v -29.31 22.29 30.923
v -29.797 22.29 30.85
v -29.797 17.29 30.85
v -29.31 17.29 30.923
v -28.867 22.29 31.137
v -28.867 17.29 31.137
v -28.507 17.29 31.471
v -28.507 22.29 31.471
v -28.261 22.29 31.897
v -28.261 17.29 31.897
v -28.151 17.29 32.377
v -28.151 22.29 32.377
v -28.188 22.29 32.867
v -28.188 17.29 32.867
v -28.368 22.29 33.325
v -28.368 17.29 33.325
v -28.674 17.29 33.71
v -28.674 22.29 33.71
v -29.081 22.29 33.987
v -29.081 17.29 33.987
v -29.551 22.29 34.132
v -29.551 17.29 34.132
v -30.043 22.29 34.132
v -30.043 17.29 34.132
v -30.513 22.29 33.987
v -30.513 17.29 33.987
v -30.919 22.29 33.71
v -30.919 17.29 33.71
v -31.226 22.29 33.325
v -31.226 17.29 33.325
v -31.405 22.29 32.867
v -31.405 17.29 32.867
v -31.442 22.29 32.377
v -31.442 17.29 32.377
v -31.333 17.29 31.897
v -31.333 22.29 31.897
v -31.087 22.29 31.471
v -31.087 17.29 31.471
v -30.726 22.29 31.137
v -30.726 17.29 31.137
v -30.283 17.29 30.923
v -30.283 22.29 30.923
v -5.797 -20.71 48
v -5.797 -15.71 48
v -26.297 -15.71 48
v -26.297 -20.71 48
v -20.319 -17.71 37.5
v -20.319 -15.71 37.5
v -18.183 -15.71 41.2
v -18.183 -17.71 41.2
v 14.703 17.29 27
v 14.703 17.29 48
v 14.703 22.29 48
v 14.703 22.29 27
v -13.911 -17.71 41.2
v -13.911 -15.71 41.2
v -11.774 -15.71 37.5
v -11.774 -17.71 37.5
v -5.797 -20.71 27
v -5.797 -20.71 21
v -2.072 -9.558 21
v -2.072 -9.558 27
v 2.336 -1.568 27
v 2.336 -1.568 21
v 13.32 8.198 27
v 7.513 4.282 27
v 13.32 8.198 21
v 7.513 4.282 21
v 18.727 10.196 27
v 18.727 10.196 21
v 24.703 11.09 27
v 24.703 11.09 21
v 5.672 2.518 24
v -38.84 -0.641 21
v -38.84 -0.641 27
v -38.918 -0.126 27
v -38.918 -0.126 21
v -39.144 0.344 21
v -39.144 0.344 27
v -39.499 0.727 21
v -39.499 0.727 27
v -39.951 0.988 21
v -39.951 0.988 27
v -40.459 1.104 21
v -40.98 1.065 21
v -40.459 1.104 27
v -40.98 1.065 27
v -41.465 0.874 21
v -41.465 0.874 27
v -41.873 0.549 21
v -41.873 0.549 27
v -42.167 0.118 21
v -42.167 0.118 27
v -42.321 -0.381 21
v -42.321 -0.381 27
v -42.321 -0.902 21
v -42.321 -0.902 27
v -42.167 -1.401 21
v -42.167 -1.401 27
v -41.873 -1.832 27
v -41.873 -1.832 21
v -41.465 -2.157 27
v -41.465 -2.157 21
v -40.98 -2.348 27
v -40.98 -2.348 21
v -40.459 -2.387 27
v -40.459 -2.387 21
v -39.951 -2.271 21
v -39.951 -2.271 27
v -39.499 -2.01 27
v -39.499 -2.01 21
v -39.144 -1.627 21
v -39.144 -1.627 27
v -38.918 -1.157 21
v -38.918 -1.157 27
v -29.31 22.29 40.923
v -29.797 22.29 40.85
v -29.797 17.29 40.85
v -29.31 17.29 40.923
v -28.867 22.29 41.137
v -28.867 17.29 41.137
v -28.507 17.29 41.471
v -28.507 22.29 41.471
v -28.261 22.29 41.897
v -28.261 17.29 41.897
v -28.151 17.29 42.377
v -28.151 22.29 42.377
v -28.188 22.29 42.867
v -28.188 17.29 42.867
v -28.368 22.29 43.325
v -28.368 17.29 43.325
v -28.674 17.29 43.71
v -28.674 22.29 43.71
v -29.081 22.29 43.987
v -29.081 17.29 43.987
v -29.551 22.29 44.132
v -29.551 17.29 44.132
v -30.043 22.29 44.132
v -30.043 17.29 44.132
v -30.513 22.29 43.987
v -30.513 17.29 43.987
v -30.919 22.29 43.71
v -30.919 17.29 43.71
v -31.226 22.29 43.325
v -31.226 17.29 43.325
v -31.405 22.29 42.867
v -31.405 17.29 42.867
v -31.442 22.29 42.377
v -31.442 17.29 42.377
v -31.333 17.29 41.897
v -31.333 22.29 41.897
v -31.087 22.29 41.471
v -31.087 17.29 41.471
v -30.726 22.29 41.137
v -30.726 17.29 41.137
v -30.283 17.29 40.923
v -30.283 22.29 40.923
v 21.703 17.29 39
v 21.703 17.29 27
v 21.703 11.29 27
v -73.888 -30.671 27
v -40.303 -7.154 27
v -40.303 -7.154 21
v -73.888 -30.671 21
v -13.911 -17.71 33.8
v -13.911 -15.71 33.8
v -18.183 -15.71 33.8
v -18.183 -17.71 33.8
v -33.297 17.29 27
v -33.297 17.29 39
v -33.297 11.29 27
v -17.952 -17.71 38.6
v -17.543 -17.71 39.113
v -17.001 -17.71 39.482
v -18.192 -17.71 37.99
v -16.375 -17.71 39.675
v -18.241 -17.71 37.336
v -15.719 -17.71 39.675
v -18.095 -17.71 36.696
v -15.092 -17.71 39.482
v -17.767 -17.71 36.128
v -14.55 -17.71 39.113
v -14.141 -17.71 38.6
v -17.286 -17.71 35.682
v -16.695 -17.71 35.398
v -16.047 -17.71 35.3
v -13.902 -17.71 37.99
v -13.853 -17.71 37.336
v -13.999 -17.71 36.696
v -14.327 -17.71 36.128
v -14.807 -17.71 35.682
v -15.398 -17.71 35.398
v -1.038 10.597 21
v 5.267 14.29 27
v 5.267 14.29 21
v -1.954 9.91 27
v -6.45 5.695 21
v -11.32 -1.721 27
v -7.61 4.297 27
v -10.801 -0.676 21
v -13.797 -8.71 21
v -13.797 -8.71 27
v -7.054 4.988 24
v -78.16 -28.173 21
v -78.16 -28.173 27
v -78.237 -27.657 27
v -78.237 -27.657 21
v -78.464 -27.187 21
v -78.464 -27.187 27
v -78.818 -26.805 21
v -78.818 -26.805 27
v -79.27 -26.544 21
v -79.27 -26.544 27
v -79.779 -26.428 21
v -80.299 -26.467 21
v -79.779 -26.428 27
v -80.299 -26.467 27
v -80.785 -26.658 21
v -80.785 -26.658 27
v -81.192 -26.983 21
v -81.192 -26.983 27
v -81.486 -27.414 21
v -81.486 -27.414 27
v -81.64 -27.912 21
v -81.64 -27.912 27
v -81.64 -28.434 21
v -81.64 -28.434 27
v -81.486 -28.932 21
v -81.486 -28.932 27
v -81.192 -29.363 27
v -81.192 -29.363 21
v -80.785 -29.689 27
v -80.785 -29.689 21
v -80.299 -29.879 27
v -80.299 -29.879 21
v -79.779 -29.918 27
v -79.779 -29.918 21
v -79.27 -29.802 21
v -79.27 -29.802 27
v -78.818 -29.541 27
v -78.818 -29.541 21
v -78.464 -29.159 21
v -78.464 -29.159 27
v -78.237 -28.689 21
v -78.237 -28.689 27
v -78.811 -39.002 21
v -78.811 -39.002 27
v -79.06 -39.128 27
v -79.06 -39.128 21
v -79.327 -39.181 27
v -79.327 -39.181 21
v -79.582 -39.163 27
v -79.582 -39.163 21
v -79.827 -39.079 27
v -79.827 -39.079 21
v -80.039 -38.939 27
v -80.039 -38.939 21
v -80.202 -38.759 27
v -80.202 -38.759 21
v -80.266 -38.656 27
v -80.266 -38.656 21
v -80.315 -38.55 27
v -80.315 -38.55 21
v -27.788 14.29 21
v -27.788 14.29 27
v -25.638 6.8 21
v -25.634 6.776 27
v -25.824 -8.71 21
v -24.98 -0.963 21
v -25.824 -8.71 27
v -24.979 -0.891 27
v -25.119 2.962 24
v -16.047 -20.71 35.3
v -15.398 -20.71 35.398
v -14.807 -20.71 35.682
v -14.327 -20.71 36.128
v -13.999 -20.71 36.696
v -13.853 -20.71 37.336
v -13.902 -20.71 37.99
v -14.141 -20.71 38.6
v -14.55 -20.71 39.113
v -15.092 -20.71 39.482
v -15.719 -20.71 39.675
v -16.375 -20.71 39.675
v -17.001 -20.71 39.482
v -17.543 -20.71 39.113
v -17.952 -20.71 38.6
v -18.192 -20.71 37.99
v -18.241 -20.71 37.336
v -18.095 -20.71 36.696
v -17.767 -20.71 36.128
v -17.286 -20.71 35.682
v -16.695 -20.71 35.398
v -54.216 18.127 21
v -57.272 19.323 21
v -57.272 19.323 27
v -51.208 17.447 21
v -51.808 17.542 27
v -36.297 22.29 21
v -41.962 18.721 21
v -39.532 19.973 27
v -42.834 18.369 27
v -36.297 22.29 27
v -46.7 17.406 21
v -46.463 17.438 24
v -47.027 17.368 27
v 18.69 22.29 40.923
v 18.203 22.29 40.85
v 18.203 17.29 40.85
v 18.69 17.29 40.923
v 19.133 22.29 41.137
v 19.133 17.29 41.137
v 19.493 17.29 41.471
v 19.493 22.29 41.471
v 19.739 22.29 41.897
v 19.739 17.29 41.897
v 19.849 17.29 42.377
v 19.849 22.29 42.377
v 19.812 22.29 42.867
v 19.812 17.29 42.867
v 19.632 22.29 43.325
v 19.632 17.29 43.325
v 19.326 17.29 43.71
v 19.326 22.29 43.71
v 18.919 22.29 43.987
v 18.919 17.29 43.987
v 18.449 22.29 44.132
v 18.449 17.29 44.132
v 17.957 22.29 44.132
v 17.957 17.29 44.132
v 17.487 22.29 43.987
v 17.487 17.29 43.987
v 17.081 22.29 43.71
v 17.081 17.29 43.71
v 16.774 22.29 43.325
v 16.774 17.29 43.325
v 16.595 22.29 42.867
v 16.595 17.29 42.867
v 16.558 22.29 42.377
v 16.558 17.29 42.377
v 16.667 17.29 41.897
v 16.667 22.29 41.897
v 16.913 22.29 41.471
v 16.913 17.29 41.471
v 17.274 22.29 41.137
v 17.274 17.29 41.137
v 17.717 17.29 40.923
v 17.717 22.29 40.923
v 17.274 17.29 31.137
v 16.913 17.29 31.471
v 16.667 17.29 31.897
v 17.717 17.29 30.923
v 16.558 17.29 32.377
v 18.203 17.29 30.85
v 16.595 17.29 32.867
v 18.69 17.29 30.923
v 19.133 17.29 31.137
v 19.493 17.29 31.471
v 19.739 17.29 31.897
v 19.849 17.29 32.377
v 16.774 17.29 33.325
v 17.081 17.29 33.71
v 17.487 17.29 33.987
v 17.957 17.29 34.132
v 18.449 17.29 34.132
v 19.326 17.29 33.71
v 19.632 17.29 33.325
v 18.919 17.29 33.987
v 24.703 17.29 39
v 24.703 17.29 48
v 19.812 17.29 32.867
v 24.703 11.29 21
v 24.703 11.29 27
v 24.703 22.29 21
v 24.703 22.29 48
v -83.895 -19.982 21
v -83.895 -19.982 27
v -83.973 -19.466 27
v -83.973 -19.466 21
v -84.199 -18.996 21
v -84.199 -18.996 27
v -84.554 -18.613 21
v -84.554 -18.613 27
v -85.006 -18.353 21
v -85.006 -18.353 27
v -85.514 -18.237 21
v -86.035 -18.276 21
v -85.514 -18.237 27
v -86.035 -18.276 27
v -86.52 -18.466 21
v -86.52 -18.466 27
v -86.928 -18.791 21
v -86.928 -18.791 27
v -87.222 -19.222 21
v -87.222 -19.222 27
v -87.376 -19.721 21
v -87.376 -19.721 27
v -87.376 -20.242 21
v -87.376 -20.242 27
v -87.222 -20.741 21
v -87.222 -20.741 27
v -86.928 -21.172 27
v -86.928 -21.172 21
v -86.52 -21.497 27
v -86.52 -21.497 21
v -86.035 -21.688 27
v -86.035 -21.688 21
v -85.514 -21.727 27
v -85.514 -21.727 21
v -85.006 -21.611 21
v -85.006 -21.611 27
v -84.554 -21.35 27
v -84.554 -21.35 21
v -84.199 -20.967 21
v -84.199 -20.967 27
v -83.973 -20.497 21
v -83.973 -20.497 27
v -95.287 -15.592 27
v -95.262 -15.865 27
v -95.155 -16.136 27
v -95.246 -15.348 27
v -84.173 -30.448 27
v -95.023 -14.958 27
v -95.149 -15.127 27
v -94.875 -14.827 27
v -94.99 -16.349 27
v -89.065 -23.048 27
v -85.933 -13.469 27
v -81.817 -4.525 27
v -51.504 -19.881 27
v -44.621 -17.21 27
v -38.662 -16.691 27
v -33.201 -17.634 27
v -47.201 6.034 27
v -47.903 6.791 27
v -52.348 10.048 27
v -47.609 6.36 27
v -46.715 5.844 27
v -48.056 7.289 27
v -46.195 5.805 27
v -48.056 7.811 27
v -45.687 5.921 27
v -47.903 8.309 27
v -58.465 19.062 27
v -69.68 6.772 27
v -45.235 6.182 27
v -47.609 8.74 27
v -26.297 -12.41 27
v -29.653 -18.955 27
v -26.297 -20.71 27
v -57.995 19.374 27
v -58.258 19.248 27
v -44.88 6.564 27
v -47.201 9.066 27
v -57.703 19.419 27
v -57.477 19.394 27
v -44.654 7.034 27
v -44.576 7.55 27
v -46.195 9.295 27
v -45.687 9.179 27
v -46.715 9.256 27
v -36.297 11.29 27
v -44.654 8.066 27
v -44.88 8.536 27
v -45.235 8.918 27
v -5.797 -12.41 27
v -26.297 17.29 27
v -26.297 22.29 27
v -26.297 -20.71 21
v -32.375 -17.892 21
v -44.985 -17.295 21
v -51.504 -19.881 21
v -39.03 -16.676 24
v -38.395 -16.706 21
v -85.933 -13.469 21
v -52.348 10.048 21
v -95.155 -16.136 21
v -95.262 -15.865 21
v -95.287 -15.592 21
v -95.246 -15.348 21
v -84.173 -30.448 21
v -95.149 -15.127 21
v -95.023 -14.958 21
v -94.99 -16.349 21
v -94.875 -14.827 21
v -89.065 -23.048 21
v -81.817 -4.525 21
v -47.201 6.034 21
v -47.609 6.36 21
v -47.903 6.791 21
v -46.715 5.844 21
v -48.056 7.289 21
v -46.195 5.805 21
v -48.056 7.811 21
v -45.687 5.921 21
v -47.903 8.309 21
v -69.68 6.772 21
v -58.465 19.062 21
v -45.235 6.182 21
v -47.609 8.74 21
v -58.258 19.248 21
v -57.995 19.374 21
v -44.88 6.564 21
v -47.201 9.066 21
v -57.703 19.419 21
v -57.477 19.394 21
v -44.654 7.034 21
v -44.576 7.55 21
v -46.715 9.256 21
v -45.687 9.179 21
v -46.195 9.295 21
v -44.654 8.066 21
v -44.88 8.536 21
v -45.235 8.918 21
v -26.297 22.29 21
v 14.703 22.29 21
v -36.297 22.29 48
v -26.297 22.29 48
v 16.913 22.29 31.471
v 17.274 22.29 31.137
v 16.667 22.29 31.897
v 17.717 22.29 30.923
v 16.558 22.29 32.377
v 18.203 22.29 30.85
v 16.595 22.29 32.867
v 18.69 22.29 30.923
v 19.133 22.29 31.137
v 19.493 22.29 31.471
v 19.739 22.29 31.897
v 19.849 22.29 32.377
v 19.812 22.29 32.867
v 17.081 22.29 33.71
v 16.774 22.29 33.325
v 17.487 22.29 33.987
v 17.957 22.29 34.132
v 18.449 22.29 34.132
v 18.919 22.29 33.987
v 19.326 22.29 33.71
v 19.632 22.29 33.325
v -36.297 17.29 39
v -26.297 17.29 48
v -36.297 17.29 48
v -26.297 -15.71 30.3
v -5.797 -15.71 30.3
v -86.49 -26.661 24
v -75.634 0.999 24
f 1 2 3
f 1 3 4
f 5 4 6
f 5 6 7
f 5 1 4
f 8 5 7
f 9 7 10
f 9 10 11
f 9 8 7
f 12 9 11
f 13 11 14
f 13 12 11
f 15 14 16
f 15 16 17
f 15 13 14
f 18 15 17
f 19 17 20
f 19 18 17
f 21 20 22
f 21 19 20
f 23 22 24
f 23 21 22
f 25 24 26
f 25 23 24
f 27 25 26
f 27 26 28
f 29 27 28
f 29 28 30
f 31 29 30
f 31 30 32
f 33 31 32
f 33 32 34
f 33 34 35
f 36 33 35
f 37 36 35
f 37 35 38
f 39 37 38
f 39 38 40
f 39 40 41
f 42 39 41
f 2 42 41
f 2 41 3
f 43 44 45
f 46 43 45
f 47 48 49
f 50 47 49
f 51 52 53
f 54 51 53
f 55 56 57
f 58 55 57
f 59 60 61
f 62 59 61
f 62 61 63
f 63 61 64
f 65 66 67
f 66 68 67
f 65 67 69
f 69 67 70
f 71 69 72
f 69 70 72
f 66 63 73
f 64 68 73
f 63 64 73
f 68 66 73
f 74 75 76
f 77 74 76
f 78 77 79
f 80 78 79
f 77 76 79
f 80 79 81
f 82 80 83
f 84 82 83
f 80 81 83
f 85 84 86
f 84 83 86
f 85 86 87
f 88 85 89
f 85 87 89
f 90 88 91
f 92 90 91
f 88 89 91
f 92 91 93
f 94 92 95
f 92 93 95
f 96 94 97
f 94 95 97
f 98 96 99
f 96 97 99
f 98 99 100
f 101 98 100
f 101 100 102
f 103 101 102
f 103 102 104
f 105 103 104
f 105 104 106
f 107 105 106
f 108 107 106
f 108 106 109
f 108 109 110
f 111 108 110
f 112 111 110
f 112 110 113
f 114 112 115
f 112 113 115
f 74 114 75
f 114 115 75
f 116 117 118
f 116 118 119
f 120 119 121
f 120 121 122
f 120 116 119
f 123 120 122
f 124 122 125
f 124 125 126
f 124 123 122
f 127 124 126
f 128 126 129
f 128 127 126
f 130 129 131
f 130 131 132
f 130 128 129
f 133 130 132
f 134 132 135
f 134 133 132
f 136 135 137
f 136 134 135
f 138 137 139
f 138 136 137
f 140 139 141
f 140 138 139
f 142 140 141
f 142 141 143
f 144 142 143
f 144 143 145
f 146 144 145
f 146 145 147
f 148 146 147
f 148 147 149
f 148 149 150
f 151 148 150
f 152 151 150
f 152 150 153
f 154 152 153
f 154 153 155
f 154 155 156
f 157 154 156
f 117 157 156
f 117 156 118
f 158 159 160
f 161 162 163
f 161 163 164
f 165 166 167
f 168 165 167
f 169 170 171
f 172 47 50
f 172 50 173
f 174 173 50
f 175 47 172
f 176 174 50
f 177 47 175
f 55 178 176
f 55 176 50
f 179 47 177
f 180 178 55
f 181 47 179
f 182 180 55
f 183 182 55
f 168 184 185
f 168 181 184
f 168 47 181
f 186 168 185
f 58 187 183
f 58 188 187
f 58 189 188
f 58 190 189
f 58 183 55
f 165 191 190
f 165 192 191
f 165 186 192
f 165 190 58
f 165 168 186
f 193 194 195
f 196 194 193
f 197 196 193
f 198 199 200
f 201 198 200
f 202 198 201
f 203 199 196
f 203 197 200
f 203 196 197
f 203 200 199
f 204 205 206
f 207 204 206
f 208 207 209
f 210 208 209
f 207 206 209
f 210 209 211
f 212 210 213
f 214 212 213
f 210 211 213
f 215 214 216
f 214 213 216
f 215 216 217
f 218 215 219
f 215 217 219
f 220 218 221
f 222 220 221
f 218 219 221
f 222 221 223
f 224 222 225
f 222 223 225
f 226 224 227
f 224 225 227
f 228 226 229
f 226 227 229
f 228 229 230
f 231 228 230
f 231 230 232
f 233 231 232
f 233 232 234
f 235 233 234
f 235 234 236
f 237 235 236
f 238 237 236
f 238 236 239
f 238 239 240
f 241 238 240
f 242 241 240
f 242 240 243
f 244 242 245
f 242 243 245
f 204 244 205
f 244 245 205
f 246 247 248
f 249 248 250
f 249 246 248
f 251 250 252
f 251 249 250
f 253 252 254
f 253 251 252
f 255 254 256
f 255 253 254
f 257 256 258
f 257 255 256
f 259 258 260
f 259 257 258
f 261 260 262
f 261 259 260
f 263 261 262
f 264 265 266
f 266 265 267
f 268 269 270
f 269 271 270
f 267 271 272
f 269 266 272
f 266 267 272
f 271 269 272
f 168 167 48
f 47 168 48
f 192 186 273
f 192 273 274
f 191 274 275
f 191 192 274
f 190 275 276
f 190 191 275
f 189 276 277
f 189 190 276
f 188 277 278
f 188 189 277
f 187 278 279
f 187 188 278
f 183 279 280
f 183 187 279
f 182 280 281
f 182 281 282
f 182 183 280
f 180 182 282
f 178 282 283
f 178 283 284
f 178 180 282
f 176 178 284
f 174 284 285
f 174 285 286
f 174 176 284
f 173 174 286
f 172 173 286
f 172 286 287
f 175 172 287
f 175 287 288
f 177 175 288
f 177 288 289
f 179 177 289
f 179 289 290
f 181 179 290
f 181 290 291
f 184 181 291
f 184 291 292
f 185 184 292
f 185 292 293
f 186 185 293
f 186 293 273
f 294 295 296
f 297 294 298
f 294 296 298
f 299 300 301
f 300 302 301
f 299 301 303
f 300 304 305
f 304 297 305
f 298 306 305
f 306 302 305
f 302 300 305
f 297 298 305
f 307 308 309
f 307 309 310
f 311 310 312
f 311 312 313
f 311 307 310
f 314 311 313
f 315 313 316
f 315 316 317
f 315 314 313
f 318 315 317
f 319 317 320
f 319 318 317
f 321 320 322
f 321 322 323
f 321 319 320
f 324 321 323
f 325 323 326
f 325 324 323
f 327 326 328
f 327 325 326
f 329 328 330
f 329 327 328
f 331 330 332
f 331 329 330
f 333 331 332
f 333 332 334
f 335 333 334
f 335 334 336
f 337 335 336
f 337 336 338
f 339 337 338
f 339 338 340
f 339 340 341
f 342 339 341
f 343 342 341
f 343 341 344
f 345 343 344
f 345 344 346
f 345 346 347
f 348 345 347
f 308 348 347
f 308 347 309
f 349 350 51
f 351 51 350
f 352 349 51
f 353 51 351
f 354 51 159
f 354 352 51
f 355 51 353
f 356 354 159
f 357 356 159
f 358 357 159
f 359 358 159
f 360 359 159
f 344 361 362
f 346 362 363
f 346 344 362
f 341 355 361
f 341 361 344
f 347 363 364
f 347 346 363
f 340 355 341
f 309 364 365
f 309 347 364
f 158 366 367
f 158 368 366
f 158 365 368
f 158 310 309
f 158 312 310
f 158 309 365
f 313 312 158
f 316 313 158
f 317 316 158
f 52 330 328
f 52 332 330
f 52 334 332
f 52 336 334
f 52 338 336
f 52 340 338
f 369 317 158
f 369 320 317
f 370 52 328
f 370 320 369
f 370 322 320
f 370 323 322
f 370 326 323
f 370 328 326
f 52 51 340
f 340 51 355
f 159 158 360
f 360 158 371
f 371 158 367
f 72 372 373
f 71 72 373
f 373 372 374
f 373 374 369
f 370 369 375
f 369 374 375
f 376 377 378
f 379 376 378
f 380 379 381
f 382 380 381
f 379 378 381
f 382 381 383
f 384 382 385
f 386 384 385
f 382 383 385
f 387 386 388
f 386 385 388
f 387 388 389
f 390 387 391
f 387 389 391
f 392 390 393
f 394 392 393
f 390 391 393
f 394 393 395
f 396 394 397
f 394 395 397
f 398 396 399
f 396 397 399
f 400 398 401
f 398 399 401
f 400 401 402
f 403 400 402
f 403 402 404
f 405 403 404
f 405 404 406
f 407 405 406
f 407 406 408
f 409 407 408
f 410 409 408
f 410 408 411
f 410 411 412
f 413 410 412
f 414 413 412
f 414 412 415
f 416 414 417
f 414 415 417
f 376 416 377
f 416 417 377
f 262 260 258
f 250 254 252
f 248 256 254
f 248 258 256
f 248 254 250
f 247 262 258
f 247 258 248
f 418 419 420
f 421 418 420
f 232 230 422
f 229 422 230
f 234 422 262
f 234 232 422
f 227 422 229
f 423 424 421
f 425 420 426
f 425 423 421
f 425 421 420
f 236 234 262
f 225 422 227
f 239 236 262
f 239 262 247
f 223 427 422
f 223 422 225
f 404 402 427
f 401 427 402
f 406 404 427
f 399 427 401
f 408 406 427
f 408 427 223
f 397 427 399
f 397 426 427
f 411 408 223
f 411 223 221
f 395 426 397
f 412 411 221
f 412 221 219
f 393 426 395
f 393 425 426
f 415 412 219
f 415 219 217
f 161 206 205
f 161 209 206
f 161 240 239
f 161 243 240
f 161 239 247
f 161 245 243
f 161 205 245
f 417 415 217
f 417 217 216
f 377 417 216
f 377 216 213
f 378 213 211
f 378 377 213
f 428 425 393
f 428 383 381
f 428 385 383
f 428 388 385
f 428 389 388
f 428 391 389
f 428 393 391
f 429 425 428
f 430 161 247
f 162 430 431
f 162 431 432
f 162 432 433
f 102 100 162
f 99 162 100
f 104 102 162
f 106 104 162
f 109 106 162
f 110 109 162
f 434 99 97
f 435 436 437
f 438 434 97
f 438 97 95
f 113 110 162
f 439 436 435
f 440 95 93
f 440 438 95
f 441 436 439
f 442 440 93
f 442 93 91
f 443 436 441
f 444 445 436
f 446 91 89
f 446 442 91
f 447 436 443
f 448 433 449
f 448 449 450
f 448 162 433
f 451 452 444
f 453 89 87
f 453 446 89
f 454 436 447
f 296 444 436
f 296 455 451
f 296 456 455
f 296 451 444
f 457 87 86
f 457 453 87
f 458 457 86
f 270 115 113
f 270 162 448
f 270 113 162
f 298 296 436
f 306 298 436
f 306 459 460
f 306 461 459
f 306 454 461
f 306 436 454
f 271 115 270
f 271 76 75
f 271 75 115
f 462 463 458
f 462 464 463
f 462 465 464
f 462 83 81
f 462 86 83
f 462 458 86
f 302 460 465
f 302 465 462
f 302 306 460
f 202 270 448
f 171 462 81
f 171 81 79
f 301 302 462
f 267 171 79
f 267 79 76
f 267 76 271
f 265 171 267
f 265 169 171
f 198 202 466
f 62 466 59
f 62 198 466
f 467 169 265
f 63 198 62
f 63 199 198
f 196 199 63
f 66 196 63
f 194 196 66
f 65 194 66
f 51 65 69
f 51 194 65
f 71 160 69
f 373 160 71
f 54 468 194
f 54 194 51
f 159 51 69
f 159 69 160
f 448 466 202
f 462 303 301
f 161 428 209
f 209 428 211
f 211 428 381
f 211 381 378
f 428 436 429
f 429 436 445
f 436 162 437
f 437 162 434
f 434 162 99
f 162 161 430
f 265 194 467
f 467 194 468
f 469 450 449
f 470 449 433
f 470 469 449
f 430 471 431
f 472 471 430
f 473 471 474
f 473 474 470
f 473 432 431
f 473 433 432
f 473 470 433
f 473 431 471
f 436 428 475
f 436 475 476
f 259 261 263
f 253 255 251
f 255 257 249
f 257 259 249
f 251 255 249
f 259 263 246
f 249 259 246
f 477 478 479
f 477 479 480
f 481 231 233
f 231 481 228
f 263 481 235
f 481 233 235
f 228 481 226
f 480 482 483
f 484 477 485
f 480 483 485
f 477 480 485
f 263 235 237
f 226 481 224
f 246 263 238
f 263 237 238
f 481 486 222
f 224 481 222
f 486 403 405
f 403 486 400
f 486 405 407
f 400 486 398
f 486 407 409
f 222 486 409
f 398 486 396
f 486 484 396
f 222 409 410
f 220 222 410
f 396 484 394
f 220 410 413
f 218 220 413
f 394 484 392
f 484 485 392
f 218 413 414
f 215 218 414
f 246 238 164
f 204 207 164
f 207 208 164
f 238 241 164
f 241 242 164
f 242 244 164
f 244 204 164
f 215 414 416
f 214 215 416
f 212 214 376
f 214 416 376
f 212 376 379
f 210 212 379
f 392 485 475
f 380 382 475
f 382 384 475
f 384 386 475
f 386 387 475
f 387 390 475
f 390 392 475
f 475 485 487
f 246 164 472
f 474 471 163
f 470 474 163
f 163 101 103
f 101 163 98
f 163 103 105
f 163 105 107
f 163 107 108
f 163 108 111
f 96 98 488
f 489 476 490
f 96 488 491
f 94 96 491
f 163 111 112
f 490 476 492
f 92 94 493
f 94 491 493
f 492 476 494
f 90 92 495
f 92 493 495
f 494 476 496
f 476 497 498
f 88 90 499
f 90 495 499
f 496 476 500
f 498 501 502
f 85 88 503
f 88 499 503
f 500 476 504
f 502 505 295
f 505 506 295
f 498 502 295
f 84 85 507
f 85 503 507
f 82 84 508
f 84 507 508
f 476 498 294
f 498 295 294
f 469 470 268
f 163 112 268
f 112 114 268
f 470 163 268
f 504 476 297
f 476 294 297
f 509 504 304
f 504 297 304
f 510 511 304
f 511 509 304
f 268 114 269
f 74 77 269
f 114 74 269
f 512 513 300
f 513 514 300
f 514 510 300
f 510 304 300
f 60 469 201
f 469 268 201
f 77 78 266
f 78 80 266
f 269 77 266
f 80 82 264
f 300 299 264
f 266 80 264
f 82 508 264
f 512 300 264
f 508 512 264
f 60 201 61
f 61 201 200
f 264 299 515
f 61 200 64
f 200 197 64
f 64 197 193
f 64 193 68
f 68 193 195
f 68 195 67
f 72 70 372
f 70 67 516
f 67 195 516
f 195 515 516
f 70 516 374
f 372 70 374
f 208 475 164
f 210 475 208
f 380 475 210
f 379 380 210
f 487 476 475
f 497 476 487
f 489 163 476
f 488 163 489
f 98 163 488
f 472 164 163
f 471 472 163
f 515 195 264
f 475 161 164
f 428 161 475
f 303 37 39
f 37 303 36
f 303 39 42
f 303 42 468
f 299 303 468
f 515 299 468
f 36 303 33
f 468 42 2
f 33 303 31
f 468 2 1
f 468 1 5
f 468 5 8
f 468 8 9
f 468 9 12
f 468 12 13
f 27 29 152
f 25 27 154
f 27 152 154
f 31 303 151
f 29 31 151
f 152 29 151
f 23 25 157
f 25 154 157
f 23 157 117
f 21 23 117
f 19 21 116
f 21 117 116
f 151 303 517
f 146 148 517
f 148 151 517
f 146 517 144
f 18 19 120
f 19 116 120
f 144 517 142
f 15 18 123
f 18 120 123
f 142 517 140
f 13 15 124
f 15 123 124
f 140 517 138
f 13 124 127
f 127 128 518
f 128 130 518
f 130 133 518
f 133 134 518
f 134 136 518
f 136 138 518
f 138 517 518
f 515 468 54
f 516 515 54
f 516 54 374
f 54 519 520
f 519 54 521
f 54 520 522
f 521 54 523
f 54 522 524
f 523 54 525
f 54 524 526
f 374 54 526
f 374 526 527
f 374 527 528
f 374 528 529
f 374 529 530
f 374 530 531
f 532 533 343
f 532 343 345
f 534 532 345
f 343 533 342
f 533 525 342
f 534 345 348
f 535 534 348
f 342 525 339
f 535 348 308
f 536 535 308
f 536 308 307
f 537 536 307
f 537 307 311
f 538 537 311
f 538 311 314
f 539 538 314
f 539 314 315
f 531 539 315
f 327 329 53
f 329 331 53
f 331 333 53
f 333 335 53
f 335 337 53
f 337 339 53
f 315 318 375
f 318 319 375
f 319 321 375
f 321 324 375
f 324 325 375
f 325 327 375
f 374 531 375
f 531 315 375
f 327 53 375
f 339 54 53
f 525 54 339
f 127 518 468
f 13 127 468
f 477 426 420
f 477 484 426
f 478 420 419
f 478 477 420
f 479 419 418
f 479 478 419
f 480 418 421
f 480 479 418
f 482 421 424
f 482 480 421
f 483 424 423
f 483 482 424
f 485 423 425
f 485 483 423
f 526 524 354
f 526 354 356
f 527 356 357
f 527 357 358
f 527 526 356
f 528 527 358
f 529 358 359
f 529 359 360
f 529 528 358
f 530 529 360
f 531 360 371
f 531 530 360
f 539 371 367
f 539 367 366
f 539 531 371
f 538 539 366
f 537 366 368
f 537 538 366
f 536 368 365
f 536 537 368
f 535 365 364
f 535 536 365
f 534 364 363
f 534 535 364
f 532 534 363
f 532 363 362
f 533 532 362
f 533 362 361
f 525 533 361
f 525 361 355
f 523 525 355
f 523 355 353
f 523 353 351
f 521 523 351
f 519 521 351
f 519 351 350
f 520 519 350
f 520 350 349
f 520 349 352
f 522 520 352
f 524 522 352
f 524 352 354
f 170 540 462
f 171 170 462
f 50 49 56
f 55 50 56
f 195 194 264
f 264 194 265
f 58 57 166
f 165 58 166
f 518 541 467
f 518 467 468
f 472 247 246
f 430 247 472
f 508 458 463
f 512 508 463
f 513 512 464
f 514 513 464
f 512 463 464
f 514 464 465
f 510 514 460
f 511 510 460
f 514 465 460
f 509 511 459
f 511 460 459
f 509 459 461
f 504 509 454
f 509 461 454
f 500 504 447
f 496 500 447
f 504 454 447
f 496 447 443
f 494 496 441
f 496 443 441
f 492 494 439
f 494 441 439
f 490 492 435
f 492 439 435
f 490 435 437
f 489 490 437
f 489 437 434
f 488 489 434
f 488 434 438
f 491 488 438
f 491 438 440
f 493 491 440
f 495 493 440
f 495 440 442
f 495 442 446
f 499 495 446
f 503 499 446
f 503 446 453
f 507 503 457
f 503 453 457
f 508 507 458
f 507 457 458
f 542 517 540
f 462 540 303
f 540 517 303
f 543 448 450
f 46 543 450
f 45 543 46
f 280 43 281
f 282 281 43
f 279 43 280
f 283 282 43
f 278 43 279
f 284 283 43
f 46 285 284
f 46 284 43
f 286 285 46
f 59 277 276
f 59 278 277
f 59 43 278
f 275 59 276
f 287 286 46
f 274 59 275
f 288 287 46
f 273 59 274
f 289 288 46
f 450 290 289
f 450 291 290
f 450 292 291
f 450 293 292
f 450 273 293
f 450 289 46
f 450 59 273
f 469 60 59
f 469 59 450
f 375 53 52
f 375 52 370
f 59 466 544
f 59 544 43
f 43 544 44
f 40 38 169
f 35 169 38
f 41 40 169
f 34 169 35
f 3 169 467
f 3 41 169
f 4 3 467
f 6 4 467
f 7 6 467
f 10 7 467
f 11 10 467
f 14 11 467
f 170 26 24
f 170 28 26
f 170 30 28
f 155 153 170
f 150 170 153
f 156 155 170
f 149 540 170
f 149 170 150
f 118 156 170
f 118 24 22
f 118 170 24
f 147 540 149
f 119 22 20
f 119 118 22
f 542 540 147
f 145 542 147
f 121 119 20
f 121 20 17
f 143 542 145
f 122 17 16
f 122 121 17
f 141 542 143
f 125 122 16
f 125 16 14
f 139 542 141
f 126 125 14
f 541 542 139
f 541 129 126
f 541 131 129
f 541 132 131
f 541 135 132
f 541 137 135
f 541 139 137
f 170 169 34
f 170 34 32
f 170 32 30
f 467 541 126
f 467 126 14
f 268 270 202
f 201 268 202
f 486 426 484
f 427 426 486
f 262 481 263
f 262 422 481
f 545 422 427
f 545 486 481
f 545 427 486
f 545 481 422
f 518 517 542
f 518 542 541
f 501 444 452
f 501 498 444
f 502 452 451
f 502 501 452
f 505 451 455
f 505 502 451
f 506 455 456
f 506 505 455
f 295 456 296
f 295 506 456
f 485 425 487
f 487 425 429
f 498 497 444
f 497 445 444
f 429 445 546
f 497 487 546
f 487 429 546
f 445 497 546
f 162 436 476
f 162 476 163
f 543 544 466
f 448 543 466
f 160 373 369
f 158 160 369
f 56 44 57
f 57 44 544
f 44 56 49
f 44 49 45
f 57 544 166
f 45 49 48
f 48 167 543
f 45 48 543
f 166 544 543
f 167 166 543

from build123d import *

# Parameters (mm, degrees)
SKETCH1_W             = 10
SKETCH1_H             = 5
BOSS_EXTRUDE1_DEPTH   = 21
BOSS_EXTRUDE1_2_DEPTH = 21
BOSS_EXTRUDE2_DEPTH   = 6
SKETCH3_W             = 20.5
SKETCH3_H             = 5
BOSS_EXTRUDE3_DEPTH   = 21
CUT_EXTRUDE1_REACH    = 64.414
SKETCH4_R             = 1.65
CUT_EXTRUDE2_REACH    = 61.08
SKETCH5_R             = 2.2
SKETCH6_R             = 1.75
BOSS_EXTRUDE4_DEPTH   = 6
CUT_EXTRUDE3_REACH    = 107.857
CUT_EXTRUDE7_REACH    = 109.208
BOSS_EXTRUDE5_DEPTH   = 6
BOSS_EXTRUDE6_DEPTH   = 3
BOSS_EXTRUDE7_DEPTH   = 3
BOSS_EXTRUDE8_DEPTH   = 20.5
SKETCH16_W            = 61.423716469
SKETCH16_H            = 45.352356837
CUT_EXTRUDE8_DEPTH    = 21
CUT_EXTRUDE9_DEPTH    = 6
FILLET1_R             = 1
CUT_EXTRUDE10_DEPTH   = 2


with BuildPart() as part:
    # Sketch1 → Boss-Extrude1 (new body)
    with BuildSketch(Plane.XY):
        with Locations((-31.296703297, 19.79010989)):
            Rectangle(SKETCH1_W, SKETCH1_H)
    boss_extrude1 = extrude(amount=BOSS_EXTRUDE1_DEPTH)



with BuildPart() as body_2:
    # Sketch1 → Boss-Extrude1 2 (new body)
    with BuildSketch(Plane.XY):
        with Locations((19.703296703, 19.79010989)):
            Rectangle(SKETCH1_W, SKETCH1_H)
    boss_extrude1_2 = extrude(amount=BOSS_EXTRUDE1_2_DEPTH)


with BuildPart() as part_1:
    add(part.part)

    add(body_2.part)  # Boss-Extrude2 merges body 2
    # Sketch2 → Boss-Extrude2 (add)
    with BuildSketch(Plane.XY.offset(21)):
        Polygon((-36.296703297, 22.29010989), (24.703296703, 22.29010989), (24.703296703, 7.29010989), (12.703296703, 7.29010989), (-5.796703297, -11.20989011), (-5.796703297, -20.70989011), (-36.296703297, -20.70989011), align=None)
    extrude(amount=BOSS_EXTRUDE2_DEPTH)

    # Sketch3 → Boss-Extrude3 (add)
    with BuildSketch(Plane(origin=(0, 0, 21), x_dir=(-1, 0, 0), z_dir=(0, 0, -1))):
        with Locations((16.046703297, -18.20989011)):
            Rectangle(SKETCH3_W, SKETCH3_H)
    boss_extrude3 = extrude(amount=BOSS_EXTRUDE3_DEPTH)

    # Sketch4 → Cut-Extrude1 (cut, up to next)
    with BuildSketch(Plane(origin=(0, 22.29010989, 0), x_dir=(1, 0, 0), z_dir=(0, 1, 0)), mode=Mode.PRIVATE) as cut_extrude1_sk1:
        with Locations(Location((-29.796703297, -5.5, 0), (0, 0, 270))):
            Circle(SKETCH4_R)
    cut_extrude1_tool1 = extrude(cut_extrude1_sk1.sketch, amount=-CUT_EXTRUDE1_REACH, mode=Mode.PRIVATE) & part_1.part
    # Sketch4 → Cut-Extrude1 (cut, up to next)
    with BuildSketch(Plane(origin=(0, 22.29010989, 0), x_dir=(1, 0, 0), z_dir=(0, 1, 0)), mode=Mode.PRIVATE) as cut_extrude1_sk2:
        with Locations(Location((18.203296703, -5.5, 0), (0, 0, 270))):
            Circle(SKETCH4_R)
    cut_extrude1_tool2 = extrude(cut_extrude1_sk2.sketch, amount=-CUT_EXTRUDE1_REACH, mode=Mode.PRIVATE) & part_1.part
    # Sketch4 → Cut-Extrude1 (cut, up to next)
    with BuildSketch(Plane(origin=(0, 22.29010989, 0), x_dir=(1, 0, 0), z_dir=(0, 1, 0)), mode=Mode.PRIVATE) as cut_extrude1_sk3:
        with Locations(Location((18.203296703, -15.5, 0), (0, 0, 270))):
            Circle(SKETCH4_R)
    cut_extrude1_tool3 = extrude(cut_extrude1_sk3.sketch, amount=-CUT_EXTRUDE1_REACH, mode=Mode.PRIVATE) & part_1.part
    # Sketch4 → Cut-Extrude1 (cut, up to next)
    with BuildSketch(Plane(origin=(0, 22.29010989, 0), x_dir=(1, 0, 0), z_dir=(0, 1, 0)), mode=Mode.PRIVATE) as cut_extrude1_sk4:
        with Locations(Location((-29.796703297, -15.5, 0), (0, 0, 270))):
            Circle(SKETCH4_R)
    cut_extrude1_tool4 = extrude(cut_extrude1_sk4.sketch, amount=-CUT_EXTRUDE1_REACH, mode=Mode.PRIVATE) & part_1.part
    cut_extrude1_1 = cut_extrude1_tool1.solids().sort_by_distance((-29.796703, 22.29011, 5.5))[0]
    add(cut_extrude1_1, mode=Mode.SUBTRACT)
    cut_extrude1_2 = cut_extrude1_tool2.solids().sort_by_distance((18.203297, 22.29011, 5.5))[0]
    add(cut_extrude1_2, mode=Mode.SUBTRACT)
    cut_extrude1_3 = cut_extrude1_tool3.solids().sort_by_distance((18.203297, 22.29011, 15.5))[0]
    add(cut_extrude1_3, mode=Mode.SUBTRACT)
    cut_extrude1_4 = cut_extrude1_tool4.solids().sort_by_distance((-29.796703, 22.29011, 15.5))[0]
    add(cut_extrude1_4, mode=Mode.SUBTRACT)
    cut_extrude1 = cut_extrude1_1 + cut_extrude1_2 + cut_extrude1_3 + cut_extrude1_4  # Cut-Extrude1 as one shape, for the pattern or mirror that repeats it

    # Sketch5 → Cut-Extrude2 (cut, up to next)
    with BuildSketch(Plane(origin=(0, -15.70989011, 0), x_dir=(1, 0, 0), z_dir=(0, 1, 0)), mode=Mode.PRIVATE) as cut_extrude2_sk1:
        with Locations(Location((-16.046703297, -10.5, 0), (0, 0, 270))):
            Circle(SKETCH5_R)
    cut_extrude2_tool1 = extrude(cut_extrude2_sk1.sketch, amount=-CUT_EXTRUDE2_REACH, mode=Mode.PRIVATE) & part_1.part
    cut_extrude2 = cut_extrude2_tool1.solids().sort_by_distance((-16.046703, -15.70989, 10.5))[0]
    add(cut_extrude2, mode=Mode.SUBTRACT)

    # Sketch6 → Boss-Extrude4 (add)
    with BuildSketch(Plane.XY.offset(27)):
        with BuildLine():
            Line((-79.859138265, -39.735236509), (-51.503727763, -19.880564327))
            add(Edge.make_bspline(
                [(-51.503727763, -19.880564327), (-43.777944292, -18.491061957), (-36.296703297, -20.70989011)],
                knots=[0, 0, 0, 1, 1, 1], degree=2))
            Line((-36.296703297, -20.70989011), (-36.296703297, 22.29010989))
            add(Edge.make_bspline(
                [(-57.962836939, 19.661219133), (-46.447122218, 13.814864777), (-36.296703297, 22.29010989)],
                knots=[0, 0, 0, 1, 1, 1], degree=2))
            add(Edge.make_bspline(
                [(-95.842115451, -15.524174544), (-74.663700283, -0.348148579), (-57.962836939, 19.661219133)],
                knots=[0, 0, 0, 1, 1, 1], degree=2))
            add(Edge.make_bspline(
                [(-95.842115451, -15.524174544), (-85.086697095, -25.754599345), (-79.859138265, -39.735236509)],
                knots=[0, 0, 0, 1, 1, 1], degree=2))
        make_face()
        with Locations((-40.590214383, -0.641481396)):
            Circle(SKETCH6_R, mode=Mode.SUBTRACT)
        with Locations((-85.645276872, -19.981629898)):
            Circle(SKETCH6_R, mode=Mode.SUBTRACT)
        with Locations((-79.909512508, -28.173150341)):
            Circle(SKETCH6_R, mode=Mode.SUBTRACT)
        with Locations((-46.325978746, 7.550039047)):
            Circle(SKETCH6_R, mode=Mode.SUBTRACT)
        Polygon((-85.932915117, -13.468776127), (-52.347681301, 10.047857763), (-40.302576138, -7.154335167), (-73.887809953, -30.670969058), align=None, mode=Mode.SUBTRACT)
    extrude(amount=-BOSS_EXTRUDE4_DEPTH)

    # Sketch7 → Cut-Extrude3 (cut, up to next)
    with BuildSketch(Plane(origin=(0, 0, 21), x_dir=(-1, 0, 0), z_dir=(0, 0, -1)), mode=Mode.PRIVATE) as cut_extrude3_sk1:
        with BuildLine():
            Line((36.296703297, -20.70989011), (26.296703297, -20.70989011))
            add(Edge.make_bspline(
                [(26.296703297, -20.70989011), (39.15974316, -13.056772406), (51.503727763, -19.880564327)],
                knots=[0, 0, 0, 1, 1, 1], degree=2))
            add(Edge.make_bspline(
                [(51.503727763, -19.880564327), (43.777944292, -18.491061957), (36.296703297, -20.70989011)],
                knots=[0, 0, 0, 1, 1, 1], degree=2))
        make_face()
    cut_extrude3_tool1 = extrude(cut_extrude3_sk1.sketch, amount=-CUT_EXTRUDE3_REACH, mode=Mode.PRIVATE) & part_1.part
    add(cut_extrude3_tool1.solids().sort_by_distance((-38.072503, -18.786508, 21))[0], mode=Mode.SUBTRACT)

    # Sketch10 → Cut-Extrude7 (cut, up to next)
    with BuildSketch(Plane.XY.offset(27), mode=Mode.PRIVATE) as cut_extrude7_sk1:
        with BuildLine():
            Line((5.266834936, 14.29010989), (-27.788194587, 14.29010989))
            add(Edge.make_bspline(
                [(-27.788194587, 14.29010989), (-23.431396766, 3.132914333), (-25.823714091, -8.70989011)],
                knots=[0, 0, 0, 1, 1, 1], degree=2))
            Line((-25.823714091, -8.70989011), (-13.796703297, -8.70989011))
            add(Edge.make_bspline(
                [(5.266834936, 14.29010989), (-9.842167425, 7.185288479), (-13.796703297, -8.70989011)],
                knots=[0, 0, 0, 1, 1, 1], degree=2))
        make_face()
    cut_extrude7_tool1 = extrude(cut_extrude7_sk1.sketch, amount=-CUT_EXTRUDE7_REACH, mode=Mode.PRIVATE) & part_1.part
    add(cut_extrude7_tool1.solids().sort_by_distance((-15.764918, 4.836925, 27))[0], mode=Mode.SUBTRACT)

    # Sketch11 → Boss-Extrude5 (add)
    with BuildSketch(Plane.XY.offset(27)):
        with BuildLine():
            Line((15.119169314, 7.29010989), (12.703296703, 7.29010989))
            Line((12.703296703, 7.29010989), (-5.796703297, -11.20989011))
            Line((-5.796703297, -11.20989011), (-5.796703297, -20.70989011))
            add(Edge.make_bspline(
                [(-5.796703297, -20.70989011), (-0.06692684, -3.022661062), (15.119169314, 7.29010989)],
                knots=[0, 0, 0, 1, 1, 1], degree=2))
        make_face()
    extrude(amount=-BOSS_EXTRUDE5_DEPTH)

    # Sketch12 → Boss-Extrude6 (add)
    with BuildSketch(Plane(origin=(24.703296703, 0, 0), x_dir=(0, 0, -1), z_dir=(1, 0, 0))):
        Polygon((-21, 11.29010989), (-9, 17.29010989), (-21, 17.29010989), align=None)
    boss_extrude6 = extrude(amount=-BOSS_EXTRUDE6_DEPTH)

    # Sketch13 → Boss-Extrude7 (add)
    with BuildSketch(Plane.ZY.offset(36.296703297)):
        Polygon((21, 11.29010989), (21, 17.29010989), (9, 17.29010989), align=None)
    boss_extrude7 = extrude(amount=-BOSS_EXTRUDE7_DEPTH)

    # Sketch14 → Boss-Extrude8 (add)
    with BuildSketch(Plane(origin=(-5.796703297, 0, 0), x_dir=(0, 0, -1), z_dir=(1, 0, 0))):
        Polygon((-17.7, -15.70989011), (-21, -12.40989011), (-21, -15.70989011), align=None)
    boss_extrude8 = extrude(amount=-BOSS_EXTRUDE8_DEPTH)

    # Mirror1: Boss-Extrude1, Boss-Extrude1 2, Boss-Extrude3, Cut-Extrude1, Cut-Extrude2, Boss-Extrude6, Boss-Extrude7, Boss-Extrude8 across plane
    add(boss_extrude1.mirror(Plane(origin=(0, 0, 24), x_dir=(1, 0, 0), z_dir=(0, 0, -1))))
    add(boss_extrude1_2.mirror(Plane(origin=(0, 0, 24), x_dir=(1, 0, 0), z_dir=(0, 0, -1))))
    add(boss_extrude3.mirror(Plane(origin=(0, 0, 24), x_dir=(1, 0, 0), z_dir=(0, 0, -1))))
    add(cut_extrude1.mirror(Plane(origin=(0, 0, 24), x_dir=(1, 0, 0), z_dir=(0, 0, -1))), mode=Mode.SUBTRACT)
    add(cut_extrude2.mirror(Plane(origin=(0, 0, 24), x_dir=(1, 0, 0), z_dir=(0, 0, -1))), mode=Mode.SUBTRACT)
    add(boss_extrude6.mirror(Plane(origin=(0, 0, 24), x_dir=(1, 0, 0), z_dir=(0, 0, -1))))
    add(boss_extrude7.mirror(Plane(origin=(0, 0, 24), x_dir=(1, 0, 0), z_dir=(0, 0, -1))))
    add(boss_extrude8.mirror(Plane(origin=(0, 0, 24), x_dir=(1, 0, 0), z_dir=(0, 0, -1))))

    # Sketch16 → Cut-Extrude8 (cut)
    with BuildSketch(Plane(origin=(0, 0, 0), x_dir=(-1, 0, 0), z_dir=(0, 0, -1))):
        with Locations((6.008561531, -0.386068529)):
            Rectangle(SKETCH16_W, SKETCH16_H)
    extrude(amount=-CUT_EXTRUDE8_DEPTH, mode=Mode.SUBTRACT)

    # Sketch17 → Cut-Extrude9 (cut)
    with BuildSketch(Plane(origin=(0, 0, 21), x_dir=(-1, 0, 0), z_dir=(0, 0, -1))):
        with BuildLine():
            Line((-24.703296703, 7.29010989), (-24.703296703, 11.09010989))
            add(Edge.make_bspline(
                [(5.796703297, -20.70989011), (-1.890928929, 9.845343686), (-24.703296703, 11.09010989)],
                knots=[0, 0, 0, 1, 1, 1], degree=2))
            add(Edge.make_bspline(
                [(5.796703297, -20.70989011), (0.06692684, -3.022661062), (-15.119169314, 7.29010989)],
                knots=[0, 0, 0, 1, 1, 1], degree=2))
            Line((-15.119169314, 7.29010989), (-24.703296703, 7.29010989))
        make_face()
    extrude(amount=-CUT_EXTRUDE9_DEPTH, mode=Mode.SUBTRACT)

    # Fillet1
    fillet1_edges = [part_1.edges().sort_by_distance(p)[0] for p in [
        (-79.859138265, -39.735236509, 24),
        (-95.842115451, -15.524174544, 24),
        (-57.962836939, 19.661219133, 24),
    ]]
    fillet(fillet1_edges, radius=FILLET1_R)

    # Sketch18 → Cut-Extrude10 (cut)
    with BuildSketch(Plane(origin=(0, -15.70989011, 0), x_dir=(1, 0, 0), z_dir=(0, 1, 0))):
        Polygon((-18.182899293, -41.2), (-13.910507301, -41.2), (-11.774311305, -37.5), (-13.910507301, -33.8), (-18.182899293, -33.8), (-20.319095289, -37.5), align=None)
    extrude(amount=-CUT_EXTRUDE10_DEPTH, mode=Mode.SUBTRACT)


solid = part_1.part
